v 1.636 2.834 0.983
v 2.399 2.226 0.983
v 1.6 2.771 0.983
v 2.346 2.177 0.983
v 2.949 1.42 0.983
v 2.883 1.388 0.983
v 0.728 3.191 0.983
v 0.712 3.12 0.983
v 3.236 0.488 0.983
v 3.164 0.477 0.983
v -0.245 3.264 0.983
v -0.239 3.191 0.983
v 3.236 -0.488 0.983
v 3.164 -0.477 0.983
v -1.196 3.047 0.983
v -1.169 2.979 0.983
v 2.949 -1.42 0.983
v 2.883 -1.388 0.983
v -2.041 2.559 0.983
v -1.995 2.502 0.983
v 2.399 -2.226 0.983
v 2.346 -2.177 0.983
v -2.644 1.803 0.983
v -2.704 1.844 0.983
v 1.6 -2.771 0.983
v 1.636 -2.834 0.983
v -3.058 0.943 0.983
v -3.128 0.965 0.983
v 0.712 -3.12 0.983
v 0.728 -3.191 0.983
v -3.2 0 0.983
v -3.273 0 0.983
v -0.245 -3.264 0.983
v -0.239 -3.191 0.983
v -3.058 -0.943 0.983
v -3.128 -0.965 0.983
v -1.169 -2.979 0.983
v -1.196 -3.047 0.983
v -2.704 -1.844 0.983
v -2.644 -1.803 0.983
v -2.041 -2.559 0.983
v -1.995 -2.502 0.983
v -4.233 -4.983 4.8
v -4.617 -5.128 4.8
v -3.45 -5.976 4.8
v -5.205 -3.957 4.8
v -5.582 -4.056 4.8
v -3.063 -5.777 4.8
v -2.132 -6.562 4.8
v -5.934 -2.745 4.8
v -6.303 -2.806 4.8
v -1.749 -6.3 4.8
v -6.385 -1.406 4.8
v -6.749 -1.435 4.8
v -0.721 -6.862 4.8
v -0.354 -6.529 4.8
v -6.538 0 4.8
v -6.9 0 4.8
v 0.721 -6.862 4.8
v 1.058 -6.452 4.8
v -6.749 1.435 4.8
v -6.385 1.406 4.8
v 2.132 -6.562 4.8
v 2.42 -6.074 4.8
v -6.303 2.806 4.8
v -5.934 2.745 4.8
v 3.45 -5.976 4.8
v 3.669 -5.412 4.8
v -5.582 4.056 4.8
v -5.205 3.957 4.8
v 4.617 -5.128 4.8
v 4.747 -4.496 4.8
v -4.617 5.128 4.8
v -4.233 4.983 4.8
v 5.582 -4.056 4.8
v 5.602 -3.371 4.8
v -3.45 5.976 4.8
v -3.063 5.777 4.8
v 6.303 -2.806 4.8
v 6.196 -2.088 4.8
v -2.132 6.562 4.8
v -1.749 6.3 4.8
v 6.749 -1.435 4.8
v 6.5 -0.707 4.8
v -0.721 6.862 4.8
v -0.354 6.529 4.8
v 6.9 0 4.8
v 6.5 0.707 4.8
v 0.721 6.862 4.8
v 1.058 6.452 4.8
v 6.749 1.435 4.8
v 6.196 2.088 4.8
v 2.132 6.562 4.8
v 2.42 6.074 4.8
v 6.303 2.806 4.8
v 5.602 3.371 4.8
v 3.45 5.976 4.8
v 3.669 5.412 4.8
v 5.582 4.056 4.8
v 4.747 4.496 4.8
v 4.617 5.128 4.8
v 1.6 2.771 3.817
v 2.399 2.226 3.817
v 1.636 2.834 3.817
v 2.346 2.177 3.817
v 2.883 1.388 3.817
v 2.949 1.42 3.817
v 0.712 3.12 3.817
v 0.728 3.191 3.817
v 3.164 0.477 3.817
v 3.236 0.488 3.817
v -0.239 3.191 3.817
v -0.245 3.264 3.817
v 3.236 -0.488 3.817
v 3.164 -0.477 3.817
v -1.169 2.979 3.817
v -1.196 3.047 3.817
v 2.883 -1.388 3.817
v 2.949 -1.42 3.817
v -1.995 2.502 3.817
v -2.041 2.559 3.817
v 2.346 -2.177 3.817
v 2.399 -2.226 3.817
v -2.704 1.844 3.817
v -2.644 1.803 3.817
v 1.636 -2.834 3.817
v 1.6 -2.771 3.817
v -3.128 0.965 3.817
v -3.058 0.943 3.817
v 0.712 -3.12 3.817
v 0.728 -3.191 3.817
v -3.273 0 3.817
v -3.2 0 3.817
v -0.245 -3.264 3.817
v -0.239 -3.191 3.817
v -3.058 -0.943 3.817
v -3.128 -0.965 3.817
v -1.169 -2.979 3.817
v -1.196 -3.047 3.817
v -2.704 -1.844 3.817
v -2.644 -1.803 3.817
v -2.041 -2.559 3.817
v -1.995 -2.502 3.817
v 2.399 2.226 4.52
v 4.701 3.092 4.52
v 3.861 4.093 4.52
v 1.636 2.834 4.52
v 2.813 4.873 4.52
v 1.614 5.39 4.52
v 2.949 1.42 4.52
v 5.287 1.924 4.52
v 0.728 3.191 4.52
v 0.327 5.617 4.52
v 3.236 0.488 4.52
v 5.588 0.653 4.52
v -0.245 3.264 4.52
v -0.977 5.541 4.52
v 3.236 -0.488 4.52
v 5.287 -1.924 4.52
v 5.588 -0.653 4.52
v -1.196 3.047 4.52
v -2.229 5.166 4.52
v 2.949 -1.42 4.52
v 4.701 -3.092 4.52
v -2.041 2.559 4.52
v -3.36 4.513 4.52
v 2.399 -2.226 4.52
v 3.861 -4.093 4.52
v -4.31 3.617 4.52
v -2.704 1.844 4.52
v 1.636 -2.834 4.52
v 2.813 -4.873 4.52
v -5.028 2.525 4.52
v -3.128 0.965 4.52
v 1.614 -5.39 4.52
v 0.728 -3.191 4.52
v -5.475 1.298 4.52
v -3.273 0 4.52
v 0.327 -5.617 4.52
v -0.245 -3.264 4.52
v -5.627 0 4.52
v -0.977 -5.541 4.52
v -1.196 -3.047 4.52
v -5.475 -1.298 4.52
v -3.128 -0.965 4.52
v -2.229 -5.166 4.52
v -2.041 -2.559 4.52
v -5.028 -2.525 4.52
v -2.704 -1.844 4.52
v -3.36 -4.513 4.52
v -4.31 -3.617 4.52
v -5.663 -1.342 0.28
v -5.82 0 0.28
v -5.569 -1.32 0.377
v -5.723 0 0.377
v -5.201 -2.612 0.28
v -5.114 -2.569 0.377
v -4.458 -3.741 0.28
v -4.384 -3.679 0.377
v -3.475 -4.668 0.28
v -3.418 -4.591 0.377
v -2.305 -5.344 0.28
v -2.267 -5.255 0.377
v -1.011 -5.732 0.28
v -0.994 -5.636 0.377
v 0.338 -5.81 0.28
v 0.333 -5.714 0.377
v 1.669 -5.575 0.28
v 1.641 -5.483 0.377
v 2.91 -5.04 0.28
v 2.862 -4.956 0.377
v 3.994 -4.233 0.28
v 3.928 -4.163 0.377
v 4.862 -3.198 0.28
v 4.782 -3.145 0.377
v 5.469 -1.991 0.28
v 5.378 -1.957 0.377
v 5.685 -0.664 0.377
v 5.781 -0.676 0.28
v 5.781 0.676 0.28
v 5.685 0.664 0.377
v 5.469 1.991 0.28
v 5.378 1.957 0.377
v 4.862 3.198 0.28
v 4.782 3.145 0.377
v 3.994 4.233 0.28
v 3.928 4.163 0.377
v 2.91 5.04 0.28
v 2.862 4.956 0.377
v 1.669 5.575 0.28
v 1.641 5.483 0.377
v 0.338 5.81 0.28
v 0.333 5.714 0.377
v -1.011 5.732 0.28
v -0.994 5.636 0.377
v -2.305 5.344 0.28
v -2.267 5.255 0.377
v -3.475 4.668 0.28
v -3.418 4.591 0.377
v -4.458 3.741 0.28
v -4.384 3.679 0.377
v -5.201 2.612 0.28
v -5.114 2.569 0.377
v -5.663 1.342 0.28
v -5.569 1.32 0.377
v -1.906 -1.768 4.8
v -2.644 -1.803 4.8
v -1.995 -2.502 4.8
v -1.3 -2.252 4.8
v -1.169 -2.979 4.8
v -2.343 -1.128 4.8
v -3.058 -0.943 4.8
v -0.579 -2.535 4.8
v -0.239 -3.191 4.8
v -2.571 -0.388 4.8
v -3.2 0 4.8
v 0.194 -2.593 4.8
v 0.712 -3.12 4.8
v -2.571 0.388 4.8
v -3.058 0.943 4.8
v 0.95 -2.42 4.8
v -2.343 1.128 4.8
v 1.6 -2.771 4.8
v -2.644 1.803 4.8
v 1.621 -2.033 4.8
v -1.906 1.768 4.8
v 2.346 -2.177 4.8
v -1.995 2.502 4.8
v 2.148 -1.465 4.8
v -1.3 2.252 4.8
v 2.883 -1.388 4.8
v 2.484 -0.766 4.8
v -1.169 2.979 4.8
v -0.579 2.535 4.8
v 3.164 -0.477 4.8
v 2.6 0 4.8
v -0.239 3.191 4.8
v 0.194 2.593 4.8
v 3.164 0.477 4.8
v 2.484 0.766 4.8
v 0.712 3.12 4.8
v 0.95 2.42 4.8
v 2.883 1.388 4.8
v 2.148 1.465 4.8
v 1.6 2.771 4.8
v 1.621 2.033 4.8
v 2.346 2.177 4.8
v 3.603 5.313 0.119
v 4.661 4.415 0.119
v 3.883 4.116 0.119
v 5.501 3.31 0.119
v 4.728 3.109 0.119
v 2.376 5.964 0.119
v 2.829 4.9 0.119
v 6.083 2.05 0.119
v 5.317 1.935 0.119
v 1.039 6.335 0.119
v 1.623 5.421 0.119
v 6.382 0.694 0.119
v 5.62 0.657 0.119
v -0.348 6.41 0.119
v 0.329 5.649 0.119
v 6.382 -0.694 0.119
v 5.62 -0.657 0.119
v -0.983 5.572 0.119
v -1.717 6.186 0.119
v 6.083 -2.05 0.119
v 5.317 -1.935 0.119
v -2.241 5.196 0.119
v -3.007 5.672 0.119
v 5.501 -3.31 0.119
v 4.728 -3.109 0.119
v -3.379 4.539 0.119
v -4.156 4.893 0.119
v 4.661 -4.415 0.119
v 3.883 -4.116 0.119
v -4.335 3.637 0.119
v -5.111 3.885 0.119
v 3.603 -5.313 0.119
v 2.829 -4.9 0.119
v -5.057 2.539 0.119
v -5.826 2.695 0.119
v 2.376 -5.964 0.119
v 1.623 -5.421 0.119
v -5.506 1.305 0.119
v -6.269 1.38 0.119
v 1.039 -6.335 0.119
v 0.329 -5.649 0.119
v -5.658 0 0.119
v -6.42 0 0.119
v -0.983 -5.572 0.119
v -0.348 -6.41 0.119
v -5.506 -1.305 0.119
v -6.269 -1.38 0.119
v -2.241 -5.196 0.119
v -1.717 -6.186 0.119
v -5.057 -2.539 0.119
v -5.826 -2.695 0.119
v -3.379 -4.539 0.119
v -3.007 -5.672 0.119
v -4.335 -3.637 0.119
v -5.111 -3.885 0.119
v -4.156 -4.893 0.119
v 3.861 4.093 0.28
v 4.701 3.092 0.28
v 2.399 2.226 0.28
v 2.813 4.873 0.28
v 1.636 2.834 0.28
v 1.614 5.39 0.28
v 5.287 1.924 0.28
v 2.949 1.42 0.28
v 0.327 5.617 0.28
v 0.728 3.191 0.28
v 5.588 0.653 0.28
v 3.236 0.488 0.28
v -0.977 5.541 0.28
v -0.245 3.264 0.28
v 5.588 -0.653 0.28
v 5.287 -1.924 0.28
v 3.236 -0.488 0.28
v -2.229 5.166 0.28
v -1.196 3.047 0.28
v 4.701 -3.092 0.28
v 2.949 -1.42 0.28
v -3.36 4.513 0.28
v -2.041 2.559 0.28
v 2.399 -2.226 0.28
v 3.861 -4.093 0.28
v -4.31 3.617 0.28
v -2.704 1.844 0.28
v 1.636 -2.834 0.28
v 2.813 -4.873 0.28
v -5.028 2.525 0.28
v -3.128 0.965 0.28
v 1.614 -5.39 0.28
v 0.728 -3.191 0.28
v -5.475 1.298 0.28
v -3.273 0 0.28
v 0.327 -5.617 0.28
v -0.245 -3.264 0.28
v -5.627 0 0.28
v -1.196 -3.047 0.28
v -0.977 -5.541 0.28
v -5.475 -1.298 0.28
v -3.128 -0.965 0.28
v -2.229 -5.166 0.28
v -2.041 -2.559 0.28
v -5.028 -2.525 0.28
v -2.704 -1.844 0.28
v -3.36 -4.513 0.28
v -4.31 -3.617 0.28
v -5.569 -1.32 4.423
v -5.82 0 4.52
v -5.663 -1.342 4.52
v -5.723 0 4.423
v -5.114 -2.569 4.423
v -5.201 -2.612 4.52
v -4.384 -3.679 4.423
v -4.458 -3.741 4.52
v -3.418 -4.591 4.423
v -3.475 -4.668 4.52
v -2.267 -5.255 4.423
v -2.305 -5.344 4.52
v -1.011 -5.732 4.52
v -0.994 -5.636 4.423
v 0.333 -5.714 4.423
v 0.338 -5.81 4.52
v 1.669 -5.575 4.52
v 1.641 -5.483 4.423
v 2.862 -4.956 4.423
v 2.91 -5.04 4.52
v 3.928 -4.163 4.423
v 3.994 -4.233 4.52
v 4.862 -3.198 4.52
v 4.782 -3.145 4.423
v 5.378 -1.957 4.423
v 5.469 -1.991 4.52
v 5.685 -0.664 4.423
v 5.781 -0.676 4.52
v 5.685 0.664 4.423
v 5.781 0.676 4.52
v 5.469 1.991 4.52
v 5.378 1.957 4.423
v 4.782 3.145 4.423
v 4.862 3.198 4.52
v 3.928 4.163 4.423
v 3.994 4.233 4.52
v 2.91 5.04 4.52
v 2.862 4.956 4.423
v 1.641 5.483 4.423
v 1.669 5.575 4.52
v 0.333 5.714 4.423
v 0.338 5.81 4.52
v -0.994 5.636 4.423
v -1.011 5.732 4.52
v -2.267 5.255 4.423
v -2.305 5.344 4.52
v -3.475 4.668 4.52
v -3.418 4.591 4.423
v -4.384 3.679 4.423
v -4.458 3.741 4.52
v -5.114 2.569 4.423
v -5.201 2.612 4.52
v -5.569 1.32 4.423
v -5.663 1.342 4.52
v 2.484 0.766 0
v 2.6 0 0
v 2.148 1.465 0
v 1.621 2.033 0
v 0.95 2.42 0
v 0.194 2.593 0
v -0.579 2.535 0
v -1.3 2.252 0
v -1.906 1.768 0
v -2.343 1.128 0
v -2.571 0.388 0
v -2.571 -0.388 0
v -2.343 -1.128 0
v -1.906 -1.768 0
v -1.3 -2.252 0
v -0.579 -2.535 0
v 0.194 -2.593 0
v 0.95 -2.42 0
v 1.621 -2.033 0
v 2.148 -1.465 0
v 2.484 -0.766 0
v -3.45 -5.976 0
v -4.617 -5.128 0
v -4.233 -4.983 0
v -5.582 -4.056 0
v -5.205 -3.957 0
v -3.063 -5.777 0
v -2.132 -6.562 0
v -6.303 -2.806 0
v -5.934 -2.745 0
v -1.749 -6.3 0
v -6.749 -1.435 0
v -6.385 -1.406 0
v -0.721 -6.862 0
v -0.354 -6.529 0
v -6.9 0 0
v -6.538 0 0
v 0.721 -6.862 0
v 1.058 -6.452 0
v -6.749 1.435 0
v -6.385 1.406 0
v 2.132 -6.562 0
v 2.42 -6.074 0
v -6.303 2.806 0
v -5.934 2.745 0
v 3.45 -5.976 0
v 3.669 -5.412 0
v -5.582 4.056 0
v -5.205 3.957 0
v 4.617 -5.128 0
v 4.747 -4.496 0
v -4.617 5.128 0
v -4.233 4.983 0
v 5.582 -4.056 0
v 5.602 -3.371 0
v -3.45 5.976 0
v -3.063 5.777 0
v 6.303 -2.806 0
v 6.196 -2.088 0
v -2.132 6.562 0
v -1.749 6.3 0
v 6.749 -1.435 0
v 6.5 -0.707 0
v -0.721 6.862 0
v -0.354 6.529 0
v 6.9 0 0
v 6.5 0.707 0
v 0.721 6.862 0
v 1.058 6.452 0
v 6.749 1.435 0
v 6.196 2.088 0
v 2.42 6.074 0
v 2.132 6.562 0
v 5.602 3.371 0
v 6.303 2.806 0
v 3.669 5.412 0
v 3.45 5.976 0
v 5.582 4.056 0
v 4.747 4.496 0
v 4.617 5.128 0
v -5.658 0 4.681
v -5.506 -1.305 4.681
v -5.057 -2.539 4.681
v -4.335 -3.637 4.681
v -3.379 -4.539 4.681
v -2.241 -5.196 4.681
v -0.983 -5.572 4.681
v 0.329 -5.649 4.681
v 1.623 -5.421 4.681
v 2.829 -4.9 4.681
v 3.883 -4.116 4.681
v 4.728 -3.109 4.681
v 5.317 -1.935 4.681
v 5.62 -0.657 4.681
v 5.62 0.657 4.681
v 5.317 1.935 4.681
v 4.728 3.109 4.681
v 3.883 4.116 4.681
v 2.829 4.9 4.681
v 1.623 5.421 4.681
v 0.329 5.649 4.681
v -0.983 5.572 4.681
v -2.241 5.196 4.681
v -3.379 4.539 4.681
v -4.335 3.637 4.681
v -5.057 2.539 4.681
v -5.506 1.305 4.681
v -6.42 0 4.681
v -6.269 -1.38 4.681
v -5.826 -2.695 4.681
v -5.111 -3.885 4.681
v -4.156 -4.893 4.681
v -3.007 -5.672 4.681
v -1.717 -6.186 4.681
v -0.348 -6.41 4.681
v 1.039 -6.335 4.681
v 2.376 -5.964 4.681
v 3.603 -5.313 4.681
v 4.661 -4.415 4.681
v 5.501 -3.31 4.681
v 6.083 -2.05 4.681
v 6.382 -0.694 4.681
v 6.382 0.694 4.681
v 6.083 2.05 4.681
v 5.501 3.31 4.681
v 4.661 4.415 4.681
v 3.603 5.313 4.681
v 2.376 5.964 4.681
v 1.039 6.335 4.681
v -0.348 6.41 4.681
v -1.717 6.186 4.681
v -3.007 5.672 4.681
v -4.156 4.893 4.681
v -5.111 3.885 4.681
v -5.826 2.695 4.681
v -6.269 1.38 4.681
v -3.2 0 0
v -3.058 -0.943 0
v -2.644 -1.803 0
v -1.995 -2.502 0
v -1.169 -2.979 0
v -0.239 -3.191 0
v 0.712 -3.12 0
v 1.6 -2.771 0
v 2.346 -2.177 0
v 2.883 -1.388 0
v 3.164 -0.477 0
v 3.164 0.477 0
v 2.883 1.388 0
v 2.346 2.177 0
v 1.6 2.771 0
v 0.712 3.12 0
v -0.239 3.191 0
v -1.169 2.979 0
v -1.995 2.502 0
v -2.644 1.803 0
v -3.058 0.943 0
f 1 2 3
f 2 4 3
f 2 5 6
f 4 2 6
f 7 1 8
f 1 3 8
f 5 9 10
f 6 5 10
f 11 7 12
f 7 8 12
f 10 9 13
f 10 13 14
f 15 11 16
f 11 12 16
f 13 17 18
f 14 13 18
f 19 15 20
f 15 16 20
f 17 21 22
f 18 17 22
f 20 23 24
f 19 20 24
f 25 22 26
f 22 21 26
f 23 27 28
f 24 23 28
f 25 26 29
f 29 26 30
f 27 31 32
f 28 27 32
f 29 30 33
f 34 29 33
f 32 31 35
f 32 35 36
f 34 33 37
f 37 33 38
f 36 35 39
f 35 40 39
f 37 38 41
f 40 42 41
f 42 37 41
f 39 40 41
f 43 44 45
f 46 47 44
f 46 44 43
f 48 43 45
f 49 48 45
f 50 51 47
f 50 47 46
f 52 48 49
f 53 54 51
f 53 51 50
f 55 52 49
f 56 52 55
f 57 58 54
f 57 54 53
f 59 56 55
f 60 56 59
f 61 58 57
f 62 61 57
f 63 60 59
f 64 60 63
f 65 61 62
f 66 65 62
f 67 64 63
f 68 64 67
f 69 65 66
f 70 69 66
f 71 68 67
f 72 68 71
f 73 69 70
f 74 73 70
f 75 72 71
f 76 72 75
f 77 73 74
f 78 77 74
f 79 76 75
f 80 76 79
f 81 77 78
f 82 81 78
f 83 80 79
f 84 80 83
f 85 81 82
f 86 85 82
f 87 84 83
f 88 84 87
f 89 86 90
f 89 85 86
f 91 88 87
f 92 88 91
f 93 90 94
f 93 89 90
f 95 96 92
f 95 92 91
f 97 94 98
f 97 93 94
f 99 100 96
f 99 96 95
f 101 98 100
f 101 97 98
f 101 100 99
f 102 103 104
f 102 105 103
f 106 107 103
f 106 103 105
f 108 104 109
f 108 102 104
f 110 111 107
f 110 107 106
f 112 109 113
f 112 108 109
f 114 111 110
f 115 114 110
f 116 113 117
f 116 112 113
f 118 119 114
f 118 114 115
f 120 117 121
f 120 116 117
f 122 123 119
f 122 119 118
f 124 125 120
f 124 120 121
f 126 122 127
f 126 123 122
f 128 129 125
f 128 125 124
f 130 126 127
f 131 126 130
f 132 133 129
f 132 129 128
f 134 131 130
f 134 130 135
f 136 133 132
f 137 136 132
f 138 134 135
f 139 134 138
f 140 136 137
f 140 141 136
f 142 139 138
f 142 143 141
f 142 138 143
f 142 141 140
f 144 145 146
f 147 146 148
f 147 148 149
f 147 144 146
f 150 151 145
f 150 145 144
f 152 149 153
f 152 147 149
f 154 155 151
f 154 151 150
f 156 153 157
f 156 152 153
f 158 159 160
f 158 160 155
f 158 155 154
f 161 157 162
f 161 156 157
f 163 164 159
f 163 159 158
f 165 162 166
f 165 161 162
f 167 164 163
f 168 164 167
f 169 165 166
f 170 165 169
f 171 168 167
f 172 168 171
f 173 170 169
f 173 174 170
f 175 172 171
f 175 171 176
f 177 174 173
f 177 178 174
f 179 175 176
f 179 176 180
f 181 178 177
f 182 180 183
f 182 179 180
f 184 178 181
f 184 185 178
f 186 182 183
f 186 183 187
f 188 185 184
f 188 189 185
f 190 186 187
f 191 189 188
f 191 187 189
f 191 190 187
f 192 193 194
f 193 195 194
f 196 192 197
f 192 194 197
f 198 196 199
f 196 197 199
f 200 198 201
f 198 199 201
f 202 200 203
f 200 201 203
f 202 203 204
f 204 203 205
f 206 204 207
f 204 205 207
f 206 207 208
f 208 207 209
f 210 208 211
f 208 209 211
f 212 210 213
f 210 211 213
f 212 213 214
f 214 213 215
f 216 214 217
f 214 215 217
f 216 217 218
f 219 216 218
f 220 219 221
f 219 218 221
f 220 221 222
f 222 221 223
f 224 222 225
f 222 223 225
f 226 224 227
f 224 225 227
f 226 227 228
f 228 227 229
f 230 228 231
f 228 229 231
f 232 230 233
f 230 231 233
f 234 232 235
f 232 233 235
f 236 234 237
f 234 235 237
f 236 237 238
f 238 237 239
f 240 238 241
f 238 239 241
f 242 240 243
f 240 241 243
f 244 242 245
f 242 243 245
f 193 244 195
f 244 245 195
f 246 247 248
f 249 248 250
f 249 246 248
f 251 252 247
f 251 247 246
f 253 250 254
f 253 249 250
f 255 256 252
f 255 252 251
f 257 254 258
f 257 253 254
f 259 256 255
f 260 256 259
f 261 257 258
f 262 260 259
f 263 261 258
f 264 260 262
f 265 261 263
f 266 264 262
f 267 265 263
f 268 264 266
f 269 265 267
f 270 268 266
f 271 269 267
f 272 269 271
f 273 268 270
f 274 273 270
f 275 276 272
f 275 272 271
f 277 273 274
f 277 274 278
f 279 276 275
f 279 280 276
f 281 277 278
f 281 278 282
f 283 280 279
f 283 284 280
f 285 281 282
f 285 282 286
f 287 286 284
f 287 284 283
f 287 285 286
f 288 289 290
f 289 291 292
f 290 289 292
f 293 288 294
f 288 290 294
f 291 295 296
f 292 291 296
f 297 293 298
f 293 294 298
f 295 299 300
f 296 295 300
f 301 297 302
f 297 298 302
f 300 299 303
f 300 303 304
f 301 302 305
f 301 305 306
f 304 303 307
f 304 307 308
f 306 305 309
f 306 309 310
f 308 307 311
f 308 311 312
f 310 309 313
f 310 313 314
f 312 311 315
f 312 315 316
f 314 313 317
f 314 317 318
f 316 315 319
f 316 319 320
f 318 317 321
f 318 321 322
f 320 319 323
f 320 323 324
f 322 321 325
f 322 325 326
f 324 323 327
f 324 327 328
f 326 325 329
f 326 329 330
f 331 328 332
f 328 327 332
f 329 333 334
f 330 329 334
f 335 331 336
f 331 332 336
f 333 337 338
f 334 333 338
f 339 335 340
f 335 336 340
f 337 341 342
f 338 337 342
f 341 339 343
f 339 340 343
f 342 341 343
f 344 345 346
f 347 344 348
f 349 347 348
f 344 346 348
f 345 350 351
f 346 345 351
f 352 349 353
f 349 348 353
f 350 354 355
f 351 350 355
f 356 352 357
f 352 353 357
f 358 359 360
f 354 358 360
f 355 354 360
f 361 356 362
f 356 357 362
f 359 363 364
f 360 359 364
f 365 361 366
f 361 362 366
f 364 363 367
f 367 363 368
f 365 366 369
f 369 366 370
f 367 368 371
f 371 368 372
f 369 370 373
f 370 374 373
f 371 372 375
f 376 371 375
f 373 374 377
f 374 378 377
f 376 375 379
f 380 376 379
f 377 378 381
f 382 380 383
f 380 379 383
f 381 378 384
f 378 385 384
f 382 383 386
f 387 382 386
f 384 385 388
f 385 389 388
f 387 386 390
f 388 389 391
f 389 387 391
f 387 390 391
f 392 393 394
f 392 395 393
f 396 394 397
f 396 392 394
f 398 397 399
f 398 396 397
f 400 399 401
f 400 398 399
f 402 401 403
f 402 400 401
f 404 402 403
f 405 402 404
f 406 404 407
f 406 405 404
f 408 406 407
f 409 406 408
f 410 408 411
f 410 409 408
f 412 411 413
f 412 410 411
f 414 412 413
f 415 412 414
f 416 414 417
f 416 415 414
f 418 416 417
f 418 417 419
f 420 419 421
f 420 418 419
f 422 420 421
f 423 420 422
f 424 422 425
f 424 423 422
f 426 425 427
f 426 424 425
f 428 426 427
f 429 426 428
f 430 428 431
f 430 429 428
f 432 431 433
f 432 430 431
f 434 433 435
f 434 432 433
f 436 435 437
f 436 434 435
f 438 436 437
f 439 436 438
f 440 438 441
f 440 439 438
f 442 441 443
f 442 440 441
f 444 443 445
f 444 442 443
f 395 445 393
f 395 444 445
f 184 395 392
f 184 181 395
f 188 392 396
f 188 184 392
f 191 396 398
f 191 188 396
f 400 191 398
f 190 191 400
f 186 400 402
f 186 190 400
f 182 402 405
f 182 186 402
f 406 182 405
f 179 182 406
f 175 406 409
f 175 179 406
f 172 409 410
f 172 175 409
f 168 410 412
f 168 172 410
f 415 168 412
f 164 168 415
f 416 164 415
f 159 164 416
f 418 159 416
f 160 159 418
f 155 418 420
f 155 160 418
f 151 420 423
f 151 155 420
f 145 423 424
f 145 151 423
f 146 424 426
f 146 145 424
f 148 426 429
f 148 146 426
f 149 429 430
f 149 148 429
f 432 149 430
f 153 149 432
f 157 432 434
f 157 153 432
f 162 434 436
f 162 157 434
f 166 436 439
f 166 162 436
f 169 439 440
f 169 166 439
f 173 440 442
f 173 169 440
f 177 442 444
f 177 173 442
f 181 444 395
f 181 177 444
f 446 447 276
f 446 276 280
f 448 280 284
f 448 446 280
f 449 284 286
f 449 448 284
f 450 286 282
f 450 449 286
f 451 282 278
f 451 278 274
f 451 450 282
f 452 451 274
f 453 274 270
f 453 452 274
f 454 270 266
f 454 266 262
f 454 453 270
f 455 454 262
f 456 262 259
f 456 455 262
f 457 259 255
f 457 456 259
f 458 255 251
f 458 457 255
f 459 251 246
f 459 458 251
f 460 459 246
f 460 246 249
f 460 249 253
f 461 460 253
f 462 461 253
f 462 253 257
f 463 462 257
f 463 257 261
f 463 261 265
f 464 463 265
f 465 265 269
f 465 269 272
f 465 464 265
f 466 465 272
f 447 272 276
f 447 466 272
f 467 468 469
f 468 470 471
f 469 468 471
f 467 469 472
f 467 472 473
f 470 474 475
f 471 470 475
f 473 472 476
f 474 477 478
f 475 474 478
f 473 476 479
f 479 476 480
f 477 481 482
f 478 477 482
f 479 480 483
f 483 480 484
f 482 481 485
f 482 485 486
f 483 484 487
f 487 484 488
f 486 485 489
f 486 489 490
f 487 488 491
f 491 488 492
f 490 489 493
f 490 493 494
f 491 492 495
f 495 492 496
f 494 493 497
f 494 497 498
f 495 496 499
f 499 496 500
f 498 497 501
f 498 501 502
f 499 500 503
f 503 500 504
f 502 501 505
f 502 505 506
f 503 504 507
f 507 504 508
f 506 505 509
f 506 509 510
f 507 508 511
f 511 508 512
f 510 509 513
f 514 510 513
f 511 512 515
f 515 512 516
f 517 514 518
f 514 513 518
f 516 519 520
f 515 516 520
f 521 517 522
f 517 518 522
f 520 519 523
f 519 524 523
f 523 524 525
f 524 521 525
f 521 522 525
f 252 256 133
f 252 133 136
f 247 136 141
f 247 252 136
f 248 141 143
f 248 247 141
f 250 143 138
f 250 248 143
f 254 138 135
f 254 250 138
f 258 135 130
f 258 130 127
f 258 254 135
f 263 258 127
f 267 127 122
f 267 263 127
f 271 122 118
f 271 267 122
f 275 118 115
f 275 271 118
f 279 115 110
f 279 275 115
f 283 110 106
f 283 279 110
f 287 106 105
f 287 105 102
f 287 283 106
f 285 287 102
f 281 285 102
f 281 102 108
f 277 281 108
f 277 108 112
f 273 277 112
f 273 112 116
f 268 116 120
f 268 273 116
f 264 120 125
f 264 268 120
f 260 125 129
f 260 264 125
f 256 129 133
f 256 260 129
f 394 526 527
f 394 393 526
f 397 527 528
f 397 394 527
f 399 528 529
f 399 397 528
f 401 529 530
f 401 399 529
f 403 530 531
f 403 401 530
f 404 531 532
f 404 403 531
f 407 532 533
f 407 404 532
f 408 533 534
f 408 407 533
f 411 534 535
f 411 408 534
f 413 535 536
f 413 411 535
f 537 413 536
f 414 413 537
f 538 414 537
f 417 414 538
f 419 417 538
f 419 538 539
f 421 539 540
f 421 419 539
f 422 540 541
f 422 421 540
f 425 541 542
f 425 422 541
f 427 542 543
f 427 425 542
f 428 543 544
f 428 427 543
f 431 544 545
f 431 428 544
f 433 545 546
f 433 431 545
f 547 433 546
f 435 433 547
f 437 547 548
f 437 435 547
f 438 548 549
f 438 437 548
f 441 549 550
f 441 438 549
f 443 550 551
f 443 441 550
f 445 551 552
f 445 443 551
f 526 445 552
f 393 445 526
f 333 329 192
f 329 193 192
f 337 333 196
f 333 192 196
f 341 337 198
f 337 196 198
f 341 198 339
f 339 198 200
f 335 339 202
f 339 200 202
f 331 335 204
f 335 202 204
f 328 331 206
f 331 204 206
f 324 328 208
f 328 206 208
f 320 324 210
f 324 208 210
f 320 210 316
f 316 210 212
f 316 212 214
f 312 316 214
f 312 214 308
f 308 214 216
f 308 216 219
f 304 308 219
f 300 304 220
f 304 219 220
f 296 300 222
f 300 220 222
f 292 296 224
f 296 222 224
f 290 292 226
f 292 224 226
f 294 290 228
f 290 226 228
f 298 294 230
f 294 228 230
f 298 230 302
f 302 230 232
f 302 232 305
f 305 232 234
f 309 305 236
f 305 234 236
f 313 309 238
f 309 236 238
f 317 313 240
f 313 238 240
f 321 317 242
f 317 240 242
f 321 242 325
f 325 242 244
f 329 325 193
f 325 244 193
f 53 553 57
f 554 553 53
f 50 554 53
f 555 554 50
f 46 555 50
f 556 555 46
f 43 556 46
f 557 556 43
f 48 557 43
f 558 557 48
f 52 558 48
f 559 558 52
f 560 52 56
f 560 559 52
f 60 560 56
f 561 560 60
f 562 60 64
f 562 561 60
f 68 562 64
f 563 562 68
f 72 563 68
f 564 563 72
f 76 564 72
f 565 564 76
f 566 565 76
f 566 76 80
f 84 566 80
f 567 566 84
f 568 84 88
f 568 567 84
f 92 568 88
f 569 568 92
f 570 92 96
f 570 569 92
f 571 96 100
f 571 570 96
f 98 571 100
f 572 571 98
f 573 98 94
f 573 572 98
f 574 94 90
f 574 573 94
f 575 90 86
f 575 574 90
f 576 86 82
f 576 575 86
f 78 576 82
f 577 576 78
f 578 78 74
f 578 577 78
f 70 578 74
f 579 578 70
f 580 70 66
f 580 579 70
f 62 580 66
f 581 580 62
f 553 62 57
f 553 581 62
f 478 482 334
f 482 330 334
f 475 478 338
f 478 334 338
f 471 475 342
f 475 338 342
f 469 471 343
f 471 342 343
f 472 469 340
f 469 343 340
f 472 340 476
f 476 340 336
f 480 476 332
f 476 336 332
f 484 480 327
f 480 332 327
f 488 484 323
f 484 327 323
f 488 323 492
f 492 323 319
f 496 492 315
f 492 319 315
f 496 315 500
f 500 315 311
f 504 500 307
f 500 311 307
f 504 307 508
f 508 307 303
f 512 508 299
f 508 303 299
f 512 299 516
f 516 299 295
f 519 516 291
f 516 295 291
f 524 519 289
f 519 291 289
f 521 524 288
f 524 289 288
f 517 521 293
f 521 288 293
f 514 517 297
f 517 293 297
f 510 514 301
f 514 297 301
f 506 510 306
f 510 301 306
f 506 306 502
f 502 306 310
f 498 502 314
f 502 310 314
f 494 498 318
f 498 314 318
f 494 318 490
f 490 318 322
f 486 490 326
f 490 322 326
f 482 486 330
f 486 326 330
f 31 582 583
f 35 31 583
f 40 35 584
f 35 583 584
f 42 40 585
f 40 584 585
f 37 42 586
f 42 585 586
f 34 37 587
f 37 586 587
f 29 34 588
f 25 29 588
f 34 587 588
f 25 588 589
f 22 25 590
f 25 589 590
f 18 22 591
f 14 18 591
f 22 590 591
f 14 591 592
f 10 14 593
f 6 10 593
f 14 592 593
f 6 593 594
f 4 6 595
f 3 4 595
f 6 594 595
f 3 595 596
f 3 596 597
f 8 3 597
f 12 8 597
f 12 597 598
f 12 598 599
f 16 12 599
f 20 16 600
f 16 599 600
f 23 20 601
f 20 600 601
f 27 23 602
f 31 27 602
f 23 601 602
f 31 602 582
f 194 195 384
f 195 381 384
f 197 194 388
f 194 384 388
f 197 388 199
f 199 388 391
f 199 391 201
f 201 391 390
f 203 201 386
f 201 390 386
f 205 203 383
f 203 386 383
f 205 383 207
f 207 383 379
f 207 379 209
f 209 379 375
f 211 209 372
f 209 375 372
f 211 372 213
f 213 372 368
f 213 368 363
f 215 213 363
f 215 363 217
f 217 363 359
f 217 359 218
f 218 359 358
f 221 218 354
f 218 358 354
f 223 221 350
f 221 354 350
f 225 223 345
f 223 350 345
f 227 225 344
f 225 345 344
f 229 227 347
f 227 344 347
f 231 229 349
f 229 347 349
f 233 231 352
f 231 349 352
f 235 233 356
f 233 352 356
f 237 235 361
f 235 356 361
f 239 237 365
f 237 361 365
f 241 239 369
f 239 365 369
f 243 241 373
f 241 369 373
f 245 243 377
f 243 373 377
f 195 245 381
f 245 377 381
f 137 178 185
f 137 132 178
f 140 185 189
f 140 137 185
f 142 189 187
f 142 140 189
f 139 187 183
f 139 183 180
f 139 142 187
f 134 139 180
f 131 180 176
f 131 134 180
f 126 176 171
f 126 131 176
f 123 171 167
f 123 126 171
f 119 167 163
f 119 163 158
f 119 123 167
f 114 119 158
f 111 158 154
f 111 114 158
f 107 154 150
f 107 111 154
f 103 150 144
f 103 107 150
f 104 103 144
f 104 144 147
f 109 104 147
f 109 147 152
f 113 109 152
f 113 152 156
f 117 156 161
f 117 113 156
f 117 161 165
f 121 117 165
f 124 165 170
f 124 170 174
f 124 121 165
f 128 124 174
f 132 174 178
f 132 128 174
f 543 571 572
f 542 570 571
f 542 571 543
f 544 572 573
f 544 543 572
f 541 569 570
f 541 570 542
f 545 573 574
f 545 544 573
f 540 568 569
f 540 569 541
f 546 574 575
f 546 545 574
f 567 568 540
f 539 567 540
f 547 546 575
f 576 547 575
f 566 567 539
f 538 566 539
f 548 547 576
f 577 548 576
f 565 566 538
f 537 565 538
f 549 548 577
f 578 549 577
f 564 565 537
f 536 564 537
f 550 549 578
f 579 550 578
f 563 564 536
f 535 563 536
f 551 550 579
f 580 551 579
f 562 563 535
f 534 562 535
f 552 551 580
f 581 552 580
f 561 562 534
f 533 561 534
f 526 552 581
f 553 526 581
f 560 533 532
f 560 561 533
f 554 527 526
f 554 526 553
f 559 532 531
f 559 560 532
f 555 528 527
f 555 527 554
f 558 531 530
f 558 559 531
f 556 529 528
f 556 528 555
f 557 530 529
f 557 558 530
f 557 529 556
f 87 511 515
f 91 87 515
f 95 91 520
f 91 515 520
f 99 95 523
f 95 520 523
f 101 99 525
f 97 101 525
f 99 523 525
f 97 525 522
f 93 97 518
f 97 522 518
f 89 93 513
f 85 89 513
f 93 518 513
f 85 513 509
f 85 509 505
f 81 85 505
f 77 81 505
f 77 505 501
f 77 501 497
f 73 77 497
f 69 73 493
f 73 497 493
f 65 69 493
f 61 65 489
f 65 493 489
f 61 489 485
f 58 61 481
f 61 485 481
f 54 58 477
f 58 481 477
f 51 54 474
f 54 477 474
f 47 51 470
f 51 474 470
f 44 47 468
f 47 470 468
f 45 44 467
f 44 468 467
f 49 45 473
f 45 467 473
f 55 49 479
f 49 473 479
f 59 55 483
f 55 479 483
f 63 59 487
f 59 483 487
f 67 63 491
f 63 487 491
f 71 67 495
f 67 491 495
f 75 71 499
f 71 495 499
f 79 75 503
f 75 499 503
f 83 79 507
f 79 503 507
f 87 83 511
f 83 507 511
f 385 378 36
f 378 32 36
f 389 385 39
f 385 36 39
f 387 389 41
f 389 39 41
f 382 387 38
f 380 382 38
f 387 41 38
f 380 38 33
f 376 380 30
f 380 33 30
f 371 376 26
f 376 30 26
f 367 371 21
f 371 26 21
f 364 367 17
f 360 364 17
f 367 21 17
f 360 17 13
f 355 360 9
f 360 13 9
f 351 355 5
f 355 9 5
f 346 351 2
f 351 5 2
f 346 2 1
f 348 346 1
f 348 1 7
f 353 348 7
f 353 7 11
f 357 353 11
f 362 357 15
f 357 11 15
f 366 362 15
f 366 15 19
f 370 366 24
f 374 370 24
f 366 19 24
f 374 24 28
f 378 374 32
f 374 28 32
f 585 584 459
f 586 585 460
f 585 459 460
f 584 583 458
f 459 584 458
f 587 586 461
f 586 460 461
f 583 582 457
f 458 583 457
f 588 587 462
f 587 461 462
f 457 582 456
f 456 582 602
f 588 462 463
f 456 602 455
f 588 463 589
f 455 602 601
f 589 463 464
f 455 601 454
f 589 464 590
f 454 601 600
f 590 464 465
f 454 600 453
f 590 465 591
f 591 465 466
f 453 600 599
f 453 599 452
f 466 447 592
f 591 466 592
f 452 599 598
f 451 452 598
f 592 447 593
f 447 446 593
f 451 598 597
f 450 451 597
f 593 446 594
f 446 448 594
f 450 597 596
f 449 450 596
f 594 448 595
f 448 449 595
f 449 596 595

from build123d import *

# Parameters (mm, degrees)
SKETCH1_R           = 6.9
SKETCH1_R_2         = 2.6
BOSS_EXTRUDE1_DEPTH = 4.8


with BuildPart() as part:
    # Sketch1 → Boss-Extrude1 (new body)
    with BuildSketch(Plane.XY):
        Circle(SKETCH1_R)
        Circle(SKETCH1_R_2, mode=Mode.SUBTRACT)
    extrude(amount=BOSS_EXTRUDE1_DEPTH)

    # Sketch2 → Cut-Revolve1 (revolve, cut)
    with BuildSketch(Plane(origin=(0, 0, 0), x_dir=(0, 0, -1), z_dir=(1, 0, 0)), mode=Mode.PRIVATE) as cut_revolve1_sk:
        Polygon((-5.047973747, 6.3), (-4.9457756, 6.3), (-4.9457756, 6.684089002), (-4.6811872, 6.419500602), (-4.6811872, 5.658380737), (-4.519629847, 5.81993809), (-4.422921243, 5.723229486), (-4.519629847, 5.626520881), (-4.519629847, 3.272939667), (-3.81743033, 3.272939667), (-3.81743033, 3.2), (-4.879732163, 3.2), (-4.879732163, 0), (-5.869193326, 0), (-5.869193326, 6.3), align=None)
        Polygon((1.069193326, 6.3), (0.247973747, 6.3), (0.1457756, 6.3), (0.1457756, 6.684089002), (-0.1188128, 6.419500602), (-0.1188128, 5.658380737), (-0.280370153, 5.81993809), (-0.377078757, 5.723229486), (-0.280370153, 5.626520881), (-0.280370153, 3.272939667), (-0.98256967, 3.272939667), (-0.98256967, 3.2), (0.079732163, 3.2), (0.079732163, 0), (1.069193326, 0), align=None)
    revolve(cut_revolve1_sk.sketch.rotate(Axis((0, 0, 4.879732163), (0, 0, 1)), 90), axis=Axis((0, 0, 4.879732163), (0, 0, 1)), mode=Mode.SUBTRACT)


solid = part.part
